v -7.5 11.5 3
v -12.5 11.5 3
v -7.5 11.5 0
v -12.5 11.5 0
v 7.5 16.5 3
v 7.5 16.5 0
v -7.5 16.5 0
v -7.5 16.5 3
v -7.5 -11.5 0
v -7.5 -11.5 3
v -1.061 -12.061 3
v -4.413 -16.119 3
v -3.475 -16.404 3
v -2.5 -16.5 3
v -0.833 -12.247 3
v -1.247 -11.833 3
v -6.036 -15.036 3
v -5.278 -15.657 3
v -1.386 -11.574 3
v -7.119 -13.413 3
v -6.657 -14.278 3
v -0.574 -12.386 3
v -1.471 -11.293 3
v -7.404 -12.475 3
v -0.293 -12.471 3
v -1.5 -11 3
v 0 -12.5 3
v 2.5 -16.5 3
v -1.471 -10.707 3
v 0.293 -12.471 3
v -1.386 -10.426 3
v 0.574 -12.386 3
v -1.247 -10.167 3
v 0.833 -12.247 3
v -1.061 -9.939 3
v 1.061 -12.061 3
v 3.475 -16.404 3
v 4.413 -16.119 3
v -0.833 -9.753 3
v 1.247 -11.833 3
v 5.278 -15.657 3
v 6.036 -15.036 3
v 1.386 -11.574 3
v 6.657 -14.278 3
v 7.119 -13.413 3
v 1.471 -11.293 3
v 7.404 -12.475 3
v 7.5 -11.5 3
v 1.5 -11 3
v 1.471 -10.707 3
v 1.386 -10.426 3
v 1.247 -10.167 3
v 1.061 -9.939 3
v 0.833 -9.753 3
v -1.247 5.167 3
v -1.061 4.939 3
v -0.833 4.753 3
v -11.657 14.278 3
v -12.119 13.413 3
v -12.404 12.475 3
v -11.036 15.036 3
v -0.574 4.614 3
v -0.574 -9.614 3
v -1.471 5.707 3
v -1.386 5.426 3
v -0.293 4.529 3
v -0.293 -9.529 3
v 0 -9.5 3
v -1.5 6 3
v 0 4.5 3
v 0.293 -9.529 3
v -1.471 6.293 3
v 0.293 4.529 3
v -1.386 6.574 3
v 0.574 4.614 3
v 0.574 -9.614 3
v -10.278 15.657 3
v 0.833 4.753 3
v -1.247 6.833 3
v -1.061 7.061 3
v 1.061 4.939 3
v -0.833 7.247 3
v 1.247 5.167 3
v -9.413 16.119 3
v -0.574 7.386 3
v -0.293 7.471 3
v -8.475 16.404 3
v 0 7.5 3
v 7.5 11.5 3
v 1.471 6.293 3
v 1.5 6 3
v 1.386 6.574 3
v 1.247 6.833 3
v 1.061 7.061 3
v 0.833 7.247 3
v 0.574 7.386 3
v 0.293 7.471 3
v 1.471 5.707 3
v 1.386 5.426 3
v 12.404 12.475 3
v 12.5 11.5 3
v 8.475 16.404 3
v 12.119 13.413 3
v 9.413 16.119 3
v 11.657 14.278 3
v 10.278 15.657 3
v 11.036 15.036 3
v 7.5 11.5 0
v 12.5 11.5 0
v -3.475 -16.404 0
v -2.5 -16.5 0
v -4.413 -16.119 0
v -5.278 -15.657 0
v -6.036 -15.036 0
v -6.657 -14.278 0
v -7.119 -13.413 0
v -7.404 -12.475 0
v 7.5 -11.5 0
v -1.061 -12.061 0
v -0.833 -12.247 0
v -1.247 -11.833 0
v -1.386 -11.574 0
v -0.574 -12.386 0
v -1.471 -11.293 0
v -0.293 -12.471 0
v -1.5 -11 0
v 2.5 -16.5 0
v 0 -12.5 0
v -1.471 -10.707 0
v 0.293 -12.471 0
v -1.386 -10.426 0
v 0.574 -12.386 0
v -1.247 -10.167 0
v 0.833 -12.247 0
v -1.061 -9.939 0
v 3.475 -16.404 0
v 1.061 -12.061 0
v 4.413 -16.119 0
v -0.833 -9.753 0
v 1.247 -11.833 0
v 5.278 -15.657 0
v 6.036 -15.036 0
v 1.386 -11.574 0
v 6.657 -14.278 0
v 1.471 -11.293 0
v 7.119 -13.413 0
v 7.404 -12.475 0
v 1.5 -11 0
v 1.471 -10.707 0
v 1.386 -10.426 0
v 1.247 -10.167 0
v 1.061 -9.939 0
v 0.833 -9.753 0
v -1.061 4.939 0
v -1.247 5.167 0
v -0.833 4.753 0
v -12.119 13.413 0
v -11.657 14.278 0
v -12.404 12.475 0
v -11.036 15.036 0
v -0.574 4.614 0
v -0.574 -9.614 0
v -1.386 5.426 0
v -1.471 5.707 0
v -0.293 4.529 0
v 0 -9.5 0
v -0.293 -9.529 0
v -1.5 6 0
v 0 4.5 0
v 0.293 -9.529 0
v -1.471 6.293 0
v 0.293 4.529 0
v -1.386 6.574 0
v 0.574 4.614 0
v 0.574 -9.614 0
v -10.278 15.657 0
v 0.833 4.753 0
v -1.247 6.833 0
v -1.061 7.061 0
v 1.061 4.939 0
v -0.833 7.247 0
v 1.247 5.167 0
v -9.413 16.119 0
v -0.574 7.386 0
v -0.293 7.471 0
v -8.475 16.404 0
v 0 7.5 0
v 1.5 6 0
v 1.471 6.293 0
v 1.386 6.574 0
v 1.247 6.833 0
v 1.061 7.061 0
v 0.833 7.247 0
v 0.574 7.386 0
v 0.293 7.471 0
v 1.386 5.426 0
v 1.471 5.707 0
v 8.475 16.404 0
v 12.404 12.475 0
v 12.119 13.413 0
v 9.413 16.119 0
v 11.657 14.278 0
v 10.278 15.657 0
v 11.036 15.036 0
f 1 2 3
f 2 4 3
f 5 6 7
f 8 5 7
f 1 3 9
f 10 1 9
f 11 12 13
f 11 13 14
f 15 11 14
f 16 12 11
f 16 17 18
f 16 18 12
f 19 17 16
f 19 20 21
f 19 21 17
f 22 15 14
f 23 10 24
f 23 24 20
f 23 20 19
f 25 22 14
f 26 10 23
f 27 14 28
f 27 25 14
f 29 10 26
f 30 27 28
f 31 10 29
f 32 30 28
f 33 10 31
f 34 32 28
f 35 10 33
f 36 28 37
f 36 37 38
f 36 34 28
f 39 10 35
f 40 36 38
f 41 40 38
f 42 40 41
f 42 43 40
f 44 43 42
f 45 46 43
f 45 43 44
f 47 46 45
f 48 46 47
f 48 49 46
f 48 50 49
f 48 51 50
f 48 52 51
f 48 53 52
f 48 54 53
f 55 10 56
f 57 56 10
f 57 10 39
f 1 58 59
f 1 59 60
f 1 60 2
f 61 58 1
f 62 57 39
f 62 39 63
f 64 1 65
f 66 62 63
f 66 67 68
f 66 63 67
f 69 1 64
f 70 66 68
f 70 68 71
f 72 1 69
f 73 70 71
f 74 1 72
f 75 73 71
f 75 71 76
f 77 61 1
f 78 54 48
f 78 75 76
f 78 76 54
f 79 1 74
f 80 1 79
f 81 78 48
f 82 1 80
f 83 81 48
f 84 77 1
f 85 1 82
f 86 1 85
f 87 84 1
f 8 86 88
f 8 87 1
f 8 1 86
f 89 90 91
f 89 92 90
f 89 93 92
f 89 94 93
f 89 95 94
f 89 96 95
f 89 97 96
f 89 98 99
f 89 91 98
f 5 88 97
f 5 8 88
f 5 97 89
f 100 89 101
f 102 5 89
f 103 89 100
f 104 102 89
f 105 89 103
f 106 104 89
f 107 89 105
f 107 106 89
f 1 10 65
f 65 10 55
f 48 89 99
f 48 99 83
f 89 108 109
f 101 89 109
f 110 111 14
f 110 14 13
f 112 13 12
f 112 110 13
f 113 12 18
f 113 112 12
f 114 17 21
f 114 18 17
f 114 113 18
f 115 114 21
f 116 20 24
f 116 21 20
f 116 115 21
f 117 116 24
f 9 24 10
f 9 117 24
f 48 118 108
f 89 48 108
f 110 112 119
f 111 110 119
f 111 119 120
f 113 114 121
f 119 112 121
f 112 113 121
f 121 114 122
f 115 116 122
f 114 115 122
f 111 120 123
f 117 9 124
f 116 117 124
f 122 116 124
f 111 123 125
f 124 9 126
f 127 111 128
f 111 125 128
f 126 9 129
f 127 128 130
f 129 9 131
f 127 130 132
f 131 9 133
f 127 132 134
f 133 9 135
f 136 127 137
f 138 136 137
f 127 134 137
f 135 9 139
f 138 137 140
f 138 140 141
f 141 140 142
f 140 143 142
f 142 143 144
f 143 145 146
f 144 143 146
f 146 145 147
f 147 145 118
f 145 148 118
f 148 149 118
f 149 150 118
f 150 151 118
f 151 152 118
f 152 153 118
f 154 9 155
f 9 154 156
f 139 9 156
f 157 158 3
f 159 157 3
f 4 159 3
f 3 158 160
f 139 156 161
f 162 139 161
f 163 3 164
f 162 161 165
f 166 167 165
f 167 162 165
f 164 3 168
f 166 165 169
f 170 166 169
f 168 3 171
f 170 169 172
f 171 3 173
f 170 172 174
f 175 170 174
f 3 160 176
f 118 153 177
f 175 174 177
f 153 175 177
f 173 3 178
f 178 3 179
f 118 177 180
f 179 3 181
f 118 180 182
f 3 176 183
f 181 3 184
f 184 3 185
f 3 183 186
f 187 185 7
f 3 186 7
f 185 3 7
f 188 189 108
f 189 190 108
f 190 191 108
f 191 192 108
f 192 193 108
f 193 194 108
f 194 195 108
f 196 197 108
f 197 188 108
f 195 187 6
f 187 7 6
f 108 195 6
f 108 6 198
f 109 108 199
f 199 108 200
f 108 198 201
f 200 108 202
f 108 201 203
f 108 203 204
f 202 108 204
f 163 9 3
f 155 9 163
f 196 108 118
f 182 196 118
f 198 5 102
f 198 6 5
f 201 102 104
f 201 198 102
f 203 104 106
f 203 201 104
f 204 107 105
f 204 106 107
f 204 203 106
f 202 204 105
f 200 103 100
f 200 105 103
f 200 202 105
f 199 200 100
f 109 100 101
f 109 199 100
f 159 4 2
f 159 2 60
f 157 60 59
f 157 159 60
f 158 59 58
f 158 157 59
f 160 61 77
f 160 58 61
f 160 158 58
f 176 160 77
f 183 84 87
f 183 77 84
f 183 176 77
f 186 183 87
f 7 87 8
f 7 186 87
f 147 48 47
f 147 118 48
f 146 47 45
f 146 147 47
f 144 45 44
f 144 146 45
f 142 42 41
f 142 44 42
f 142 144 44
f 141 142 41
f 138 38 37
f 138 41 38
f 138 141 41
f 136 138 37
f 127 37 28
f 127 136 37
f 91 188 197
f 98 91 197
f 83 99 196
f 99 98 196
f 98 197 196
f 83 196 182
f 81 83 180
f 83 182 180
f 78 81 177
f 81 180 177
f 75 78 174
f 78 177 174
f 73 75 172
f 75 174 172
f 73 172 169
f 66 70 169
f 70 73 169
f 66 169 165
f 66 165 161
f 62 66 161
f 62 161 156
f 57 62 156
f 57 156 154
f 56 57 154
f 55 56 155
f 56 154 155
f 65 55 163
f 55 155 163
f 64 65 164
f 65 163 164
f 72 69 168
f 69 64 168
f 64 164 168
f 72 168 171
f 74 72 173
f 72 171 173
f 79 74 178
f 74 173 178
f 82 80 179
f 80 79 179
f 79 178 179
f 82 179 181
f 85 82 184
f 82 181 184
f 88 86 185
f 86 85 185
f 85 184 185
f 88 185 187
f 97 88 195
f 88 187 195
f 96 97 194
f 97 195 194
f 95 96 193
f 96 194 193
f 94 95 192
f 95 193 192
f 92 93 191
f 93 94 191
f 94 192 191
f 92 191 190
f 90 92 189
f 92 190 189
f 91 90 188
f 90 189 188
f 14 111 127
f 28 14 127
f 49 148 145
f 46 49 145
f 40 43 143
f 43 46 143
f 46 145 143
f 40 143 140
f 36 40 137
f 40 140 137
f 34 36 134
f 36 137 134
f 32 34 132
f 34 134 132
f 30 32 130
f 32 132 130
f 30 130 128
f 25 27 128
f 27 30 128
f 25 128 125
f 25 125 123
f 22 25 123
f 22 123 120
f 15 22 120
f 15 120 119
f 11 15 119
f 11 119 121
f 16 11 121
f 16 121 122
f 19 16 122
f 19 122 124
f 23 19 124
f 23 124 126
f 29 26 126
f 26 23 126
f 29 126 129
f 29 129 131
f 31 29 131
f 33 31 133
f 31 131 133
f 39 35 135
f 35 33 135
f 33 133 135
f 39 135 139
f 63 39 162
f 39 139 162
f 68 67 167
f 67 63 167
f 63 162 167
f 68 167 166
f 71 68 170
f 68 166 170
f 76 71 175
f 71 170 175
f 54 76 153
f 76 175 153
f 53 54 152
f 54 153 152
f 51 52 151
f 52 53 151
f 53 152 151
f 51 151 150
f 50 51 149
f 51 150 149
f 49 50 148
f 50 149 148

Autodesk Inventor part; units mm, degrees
ref_plane "YZ Plane" through (0, 0, 0) normal (1, 0, 0) x (0, 1, 0)
ref_plane "XZ Plane" through (0, 0, 0) normal (0, 1, 0) x (-1, 0, 0)
ref_plane "XY Plane" through (0, 0, 0) normal (0, 0, 1) x (1, 0, 0)
sketch "Boceto1" plane through (0, 0, 0) normal (0, 0, 1) x (1, 0, 0)
  point P0 (0, 0)
sketch "Boceto2" plane through (0, 0, 0) normal (0, 0, 1) x (1, 0, 0)
  line L0 (-12.5, 11.5) -> (-7.5, 11.5)
  circle A0 centre (0, 6) radius 1.5
  circle A1 centre (0, -11) radius 1.5
  line L1 (7.5, 11.5) -> (12.5, 11.5)
  arc A2 (12.5, 11.5) -> (7.5, 16.5) centre (7.5, 11.5) ccw
  line L2 (7.5, 16.5) -> (-7.5, 16.5)
  arc A3 (-7.5, 16.5) -> (-12.5, 11.5) centre (-7.5, 11.5) ccw
  line L3 (-7.5, 11.5) -> (-7.5, -11.5)
  arc A4 (-7.5, -11.5) -> (-2.5, -16.5) centre (-2.5, -11.5) ccw
  line L4 (-2.5, -16.5) -> (2.5, -16.5)
  arc A5 (2.5, -16.5) -> (7.5, -11.5) centre (2.5, -11.5) ccw
  line L5 (7.5, -11.5) -> (7.5, 11.5)
  point P0 (0, 0)
  point P1 (-2.5, -16.5)
  point P2 (7.5, -11.5)
extrude "Extrusión1" add sketch "Boceto2" along normal blind 3
properties part number "Motor_Support" material "MDF Tablero de fibras de densidad media"
